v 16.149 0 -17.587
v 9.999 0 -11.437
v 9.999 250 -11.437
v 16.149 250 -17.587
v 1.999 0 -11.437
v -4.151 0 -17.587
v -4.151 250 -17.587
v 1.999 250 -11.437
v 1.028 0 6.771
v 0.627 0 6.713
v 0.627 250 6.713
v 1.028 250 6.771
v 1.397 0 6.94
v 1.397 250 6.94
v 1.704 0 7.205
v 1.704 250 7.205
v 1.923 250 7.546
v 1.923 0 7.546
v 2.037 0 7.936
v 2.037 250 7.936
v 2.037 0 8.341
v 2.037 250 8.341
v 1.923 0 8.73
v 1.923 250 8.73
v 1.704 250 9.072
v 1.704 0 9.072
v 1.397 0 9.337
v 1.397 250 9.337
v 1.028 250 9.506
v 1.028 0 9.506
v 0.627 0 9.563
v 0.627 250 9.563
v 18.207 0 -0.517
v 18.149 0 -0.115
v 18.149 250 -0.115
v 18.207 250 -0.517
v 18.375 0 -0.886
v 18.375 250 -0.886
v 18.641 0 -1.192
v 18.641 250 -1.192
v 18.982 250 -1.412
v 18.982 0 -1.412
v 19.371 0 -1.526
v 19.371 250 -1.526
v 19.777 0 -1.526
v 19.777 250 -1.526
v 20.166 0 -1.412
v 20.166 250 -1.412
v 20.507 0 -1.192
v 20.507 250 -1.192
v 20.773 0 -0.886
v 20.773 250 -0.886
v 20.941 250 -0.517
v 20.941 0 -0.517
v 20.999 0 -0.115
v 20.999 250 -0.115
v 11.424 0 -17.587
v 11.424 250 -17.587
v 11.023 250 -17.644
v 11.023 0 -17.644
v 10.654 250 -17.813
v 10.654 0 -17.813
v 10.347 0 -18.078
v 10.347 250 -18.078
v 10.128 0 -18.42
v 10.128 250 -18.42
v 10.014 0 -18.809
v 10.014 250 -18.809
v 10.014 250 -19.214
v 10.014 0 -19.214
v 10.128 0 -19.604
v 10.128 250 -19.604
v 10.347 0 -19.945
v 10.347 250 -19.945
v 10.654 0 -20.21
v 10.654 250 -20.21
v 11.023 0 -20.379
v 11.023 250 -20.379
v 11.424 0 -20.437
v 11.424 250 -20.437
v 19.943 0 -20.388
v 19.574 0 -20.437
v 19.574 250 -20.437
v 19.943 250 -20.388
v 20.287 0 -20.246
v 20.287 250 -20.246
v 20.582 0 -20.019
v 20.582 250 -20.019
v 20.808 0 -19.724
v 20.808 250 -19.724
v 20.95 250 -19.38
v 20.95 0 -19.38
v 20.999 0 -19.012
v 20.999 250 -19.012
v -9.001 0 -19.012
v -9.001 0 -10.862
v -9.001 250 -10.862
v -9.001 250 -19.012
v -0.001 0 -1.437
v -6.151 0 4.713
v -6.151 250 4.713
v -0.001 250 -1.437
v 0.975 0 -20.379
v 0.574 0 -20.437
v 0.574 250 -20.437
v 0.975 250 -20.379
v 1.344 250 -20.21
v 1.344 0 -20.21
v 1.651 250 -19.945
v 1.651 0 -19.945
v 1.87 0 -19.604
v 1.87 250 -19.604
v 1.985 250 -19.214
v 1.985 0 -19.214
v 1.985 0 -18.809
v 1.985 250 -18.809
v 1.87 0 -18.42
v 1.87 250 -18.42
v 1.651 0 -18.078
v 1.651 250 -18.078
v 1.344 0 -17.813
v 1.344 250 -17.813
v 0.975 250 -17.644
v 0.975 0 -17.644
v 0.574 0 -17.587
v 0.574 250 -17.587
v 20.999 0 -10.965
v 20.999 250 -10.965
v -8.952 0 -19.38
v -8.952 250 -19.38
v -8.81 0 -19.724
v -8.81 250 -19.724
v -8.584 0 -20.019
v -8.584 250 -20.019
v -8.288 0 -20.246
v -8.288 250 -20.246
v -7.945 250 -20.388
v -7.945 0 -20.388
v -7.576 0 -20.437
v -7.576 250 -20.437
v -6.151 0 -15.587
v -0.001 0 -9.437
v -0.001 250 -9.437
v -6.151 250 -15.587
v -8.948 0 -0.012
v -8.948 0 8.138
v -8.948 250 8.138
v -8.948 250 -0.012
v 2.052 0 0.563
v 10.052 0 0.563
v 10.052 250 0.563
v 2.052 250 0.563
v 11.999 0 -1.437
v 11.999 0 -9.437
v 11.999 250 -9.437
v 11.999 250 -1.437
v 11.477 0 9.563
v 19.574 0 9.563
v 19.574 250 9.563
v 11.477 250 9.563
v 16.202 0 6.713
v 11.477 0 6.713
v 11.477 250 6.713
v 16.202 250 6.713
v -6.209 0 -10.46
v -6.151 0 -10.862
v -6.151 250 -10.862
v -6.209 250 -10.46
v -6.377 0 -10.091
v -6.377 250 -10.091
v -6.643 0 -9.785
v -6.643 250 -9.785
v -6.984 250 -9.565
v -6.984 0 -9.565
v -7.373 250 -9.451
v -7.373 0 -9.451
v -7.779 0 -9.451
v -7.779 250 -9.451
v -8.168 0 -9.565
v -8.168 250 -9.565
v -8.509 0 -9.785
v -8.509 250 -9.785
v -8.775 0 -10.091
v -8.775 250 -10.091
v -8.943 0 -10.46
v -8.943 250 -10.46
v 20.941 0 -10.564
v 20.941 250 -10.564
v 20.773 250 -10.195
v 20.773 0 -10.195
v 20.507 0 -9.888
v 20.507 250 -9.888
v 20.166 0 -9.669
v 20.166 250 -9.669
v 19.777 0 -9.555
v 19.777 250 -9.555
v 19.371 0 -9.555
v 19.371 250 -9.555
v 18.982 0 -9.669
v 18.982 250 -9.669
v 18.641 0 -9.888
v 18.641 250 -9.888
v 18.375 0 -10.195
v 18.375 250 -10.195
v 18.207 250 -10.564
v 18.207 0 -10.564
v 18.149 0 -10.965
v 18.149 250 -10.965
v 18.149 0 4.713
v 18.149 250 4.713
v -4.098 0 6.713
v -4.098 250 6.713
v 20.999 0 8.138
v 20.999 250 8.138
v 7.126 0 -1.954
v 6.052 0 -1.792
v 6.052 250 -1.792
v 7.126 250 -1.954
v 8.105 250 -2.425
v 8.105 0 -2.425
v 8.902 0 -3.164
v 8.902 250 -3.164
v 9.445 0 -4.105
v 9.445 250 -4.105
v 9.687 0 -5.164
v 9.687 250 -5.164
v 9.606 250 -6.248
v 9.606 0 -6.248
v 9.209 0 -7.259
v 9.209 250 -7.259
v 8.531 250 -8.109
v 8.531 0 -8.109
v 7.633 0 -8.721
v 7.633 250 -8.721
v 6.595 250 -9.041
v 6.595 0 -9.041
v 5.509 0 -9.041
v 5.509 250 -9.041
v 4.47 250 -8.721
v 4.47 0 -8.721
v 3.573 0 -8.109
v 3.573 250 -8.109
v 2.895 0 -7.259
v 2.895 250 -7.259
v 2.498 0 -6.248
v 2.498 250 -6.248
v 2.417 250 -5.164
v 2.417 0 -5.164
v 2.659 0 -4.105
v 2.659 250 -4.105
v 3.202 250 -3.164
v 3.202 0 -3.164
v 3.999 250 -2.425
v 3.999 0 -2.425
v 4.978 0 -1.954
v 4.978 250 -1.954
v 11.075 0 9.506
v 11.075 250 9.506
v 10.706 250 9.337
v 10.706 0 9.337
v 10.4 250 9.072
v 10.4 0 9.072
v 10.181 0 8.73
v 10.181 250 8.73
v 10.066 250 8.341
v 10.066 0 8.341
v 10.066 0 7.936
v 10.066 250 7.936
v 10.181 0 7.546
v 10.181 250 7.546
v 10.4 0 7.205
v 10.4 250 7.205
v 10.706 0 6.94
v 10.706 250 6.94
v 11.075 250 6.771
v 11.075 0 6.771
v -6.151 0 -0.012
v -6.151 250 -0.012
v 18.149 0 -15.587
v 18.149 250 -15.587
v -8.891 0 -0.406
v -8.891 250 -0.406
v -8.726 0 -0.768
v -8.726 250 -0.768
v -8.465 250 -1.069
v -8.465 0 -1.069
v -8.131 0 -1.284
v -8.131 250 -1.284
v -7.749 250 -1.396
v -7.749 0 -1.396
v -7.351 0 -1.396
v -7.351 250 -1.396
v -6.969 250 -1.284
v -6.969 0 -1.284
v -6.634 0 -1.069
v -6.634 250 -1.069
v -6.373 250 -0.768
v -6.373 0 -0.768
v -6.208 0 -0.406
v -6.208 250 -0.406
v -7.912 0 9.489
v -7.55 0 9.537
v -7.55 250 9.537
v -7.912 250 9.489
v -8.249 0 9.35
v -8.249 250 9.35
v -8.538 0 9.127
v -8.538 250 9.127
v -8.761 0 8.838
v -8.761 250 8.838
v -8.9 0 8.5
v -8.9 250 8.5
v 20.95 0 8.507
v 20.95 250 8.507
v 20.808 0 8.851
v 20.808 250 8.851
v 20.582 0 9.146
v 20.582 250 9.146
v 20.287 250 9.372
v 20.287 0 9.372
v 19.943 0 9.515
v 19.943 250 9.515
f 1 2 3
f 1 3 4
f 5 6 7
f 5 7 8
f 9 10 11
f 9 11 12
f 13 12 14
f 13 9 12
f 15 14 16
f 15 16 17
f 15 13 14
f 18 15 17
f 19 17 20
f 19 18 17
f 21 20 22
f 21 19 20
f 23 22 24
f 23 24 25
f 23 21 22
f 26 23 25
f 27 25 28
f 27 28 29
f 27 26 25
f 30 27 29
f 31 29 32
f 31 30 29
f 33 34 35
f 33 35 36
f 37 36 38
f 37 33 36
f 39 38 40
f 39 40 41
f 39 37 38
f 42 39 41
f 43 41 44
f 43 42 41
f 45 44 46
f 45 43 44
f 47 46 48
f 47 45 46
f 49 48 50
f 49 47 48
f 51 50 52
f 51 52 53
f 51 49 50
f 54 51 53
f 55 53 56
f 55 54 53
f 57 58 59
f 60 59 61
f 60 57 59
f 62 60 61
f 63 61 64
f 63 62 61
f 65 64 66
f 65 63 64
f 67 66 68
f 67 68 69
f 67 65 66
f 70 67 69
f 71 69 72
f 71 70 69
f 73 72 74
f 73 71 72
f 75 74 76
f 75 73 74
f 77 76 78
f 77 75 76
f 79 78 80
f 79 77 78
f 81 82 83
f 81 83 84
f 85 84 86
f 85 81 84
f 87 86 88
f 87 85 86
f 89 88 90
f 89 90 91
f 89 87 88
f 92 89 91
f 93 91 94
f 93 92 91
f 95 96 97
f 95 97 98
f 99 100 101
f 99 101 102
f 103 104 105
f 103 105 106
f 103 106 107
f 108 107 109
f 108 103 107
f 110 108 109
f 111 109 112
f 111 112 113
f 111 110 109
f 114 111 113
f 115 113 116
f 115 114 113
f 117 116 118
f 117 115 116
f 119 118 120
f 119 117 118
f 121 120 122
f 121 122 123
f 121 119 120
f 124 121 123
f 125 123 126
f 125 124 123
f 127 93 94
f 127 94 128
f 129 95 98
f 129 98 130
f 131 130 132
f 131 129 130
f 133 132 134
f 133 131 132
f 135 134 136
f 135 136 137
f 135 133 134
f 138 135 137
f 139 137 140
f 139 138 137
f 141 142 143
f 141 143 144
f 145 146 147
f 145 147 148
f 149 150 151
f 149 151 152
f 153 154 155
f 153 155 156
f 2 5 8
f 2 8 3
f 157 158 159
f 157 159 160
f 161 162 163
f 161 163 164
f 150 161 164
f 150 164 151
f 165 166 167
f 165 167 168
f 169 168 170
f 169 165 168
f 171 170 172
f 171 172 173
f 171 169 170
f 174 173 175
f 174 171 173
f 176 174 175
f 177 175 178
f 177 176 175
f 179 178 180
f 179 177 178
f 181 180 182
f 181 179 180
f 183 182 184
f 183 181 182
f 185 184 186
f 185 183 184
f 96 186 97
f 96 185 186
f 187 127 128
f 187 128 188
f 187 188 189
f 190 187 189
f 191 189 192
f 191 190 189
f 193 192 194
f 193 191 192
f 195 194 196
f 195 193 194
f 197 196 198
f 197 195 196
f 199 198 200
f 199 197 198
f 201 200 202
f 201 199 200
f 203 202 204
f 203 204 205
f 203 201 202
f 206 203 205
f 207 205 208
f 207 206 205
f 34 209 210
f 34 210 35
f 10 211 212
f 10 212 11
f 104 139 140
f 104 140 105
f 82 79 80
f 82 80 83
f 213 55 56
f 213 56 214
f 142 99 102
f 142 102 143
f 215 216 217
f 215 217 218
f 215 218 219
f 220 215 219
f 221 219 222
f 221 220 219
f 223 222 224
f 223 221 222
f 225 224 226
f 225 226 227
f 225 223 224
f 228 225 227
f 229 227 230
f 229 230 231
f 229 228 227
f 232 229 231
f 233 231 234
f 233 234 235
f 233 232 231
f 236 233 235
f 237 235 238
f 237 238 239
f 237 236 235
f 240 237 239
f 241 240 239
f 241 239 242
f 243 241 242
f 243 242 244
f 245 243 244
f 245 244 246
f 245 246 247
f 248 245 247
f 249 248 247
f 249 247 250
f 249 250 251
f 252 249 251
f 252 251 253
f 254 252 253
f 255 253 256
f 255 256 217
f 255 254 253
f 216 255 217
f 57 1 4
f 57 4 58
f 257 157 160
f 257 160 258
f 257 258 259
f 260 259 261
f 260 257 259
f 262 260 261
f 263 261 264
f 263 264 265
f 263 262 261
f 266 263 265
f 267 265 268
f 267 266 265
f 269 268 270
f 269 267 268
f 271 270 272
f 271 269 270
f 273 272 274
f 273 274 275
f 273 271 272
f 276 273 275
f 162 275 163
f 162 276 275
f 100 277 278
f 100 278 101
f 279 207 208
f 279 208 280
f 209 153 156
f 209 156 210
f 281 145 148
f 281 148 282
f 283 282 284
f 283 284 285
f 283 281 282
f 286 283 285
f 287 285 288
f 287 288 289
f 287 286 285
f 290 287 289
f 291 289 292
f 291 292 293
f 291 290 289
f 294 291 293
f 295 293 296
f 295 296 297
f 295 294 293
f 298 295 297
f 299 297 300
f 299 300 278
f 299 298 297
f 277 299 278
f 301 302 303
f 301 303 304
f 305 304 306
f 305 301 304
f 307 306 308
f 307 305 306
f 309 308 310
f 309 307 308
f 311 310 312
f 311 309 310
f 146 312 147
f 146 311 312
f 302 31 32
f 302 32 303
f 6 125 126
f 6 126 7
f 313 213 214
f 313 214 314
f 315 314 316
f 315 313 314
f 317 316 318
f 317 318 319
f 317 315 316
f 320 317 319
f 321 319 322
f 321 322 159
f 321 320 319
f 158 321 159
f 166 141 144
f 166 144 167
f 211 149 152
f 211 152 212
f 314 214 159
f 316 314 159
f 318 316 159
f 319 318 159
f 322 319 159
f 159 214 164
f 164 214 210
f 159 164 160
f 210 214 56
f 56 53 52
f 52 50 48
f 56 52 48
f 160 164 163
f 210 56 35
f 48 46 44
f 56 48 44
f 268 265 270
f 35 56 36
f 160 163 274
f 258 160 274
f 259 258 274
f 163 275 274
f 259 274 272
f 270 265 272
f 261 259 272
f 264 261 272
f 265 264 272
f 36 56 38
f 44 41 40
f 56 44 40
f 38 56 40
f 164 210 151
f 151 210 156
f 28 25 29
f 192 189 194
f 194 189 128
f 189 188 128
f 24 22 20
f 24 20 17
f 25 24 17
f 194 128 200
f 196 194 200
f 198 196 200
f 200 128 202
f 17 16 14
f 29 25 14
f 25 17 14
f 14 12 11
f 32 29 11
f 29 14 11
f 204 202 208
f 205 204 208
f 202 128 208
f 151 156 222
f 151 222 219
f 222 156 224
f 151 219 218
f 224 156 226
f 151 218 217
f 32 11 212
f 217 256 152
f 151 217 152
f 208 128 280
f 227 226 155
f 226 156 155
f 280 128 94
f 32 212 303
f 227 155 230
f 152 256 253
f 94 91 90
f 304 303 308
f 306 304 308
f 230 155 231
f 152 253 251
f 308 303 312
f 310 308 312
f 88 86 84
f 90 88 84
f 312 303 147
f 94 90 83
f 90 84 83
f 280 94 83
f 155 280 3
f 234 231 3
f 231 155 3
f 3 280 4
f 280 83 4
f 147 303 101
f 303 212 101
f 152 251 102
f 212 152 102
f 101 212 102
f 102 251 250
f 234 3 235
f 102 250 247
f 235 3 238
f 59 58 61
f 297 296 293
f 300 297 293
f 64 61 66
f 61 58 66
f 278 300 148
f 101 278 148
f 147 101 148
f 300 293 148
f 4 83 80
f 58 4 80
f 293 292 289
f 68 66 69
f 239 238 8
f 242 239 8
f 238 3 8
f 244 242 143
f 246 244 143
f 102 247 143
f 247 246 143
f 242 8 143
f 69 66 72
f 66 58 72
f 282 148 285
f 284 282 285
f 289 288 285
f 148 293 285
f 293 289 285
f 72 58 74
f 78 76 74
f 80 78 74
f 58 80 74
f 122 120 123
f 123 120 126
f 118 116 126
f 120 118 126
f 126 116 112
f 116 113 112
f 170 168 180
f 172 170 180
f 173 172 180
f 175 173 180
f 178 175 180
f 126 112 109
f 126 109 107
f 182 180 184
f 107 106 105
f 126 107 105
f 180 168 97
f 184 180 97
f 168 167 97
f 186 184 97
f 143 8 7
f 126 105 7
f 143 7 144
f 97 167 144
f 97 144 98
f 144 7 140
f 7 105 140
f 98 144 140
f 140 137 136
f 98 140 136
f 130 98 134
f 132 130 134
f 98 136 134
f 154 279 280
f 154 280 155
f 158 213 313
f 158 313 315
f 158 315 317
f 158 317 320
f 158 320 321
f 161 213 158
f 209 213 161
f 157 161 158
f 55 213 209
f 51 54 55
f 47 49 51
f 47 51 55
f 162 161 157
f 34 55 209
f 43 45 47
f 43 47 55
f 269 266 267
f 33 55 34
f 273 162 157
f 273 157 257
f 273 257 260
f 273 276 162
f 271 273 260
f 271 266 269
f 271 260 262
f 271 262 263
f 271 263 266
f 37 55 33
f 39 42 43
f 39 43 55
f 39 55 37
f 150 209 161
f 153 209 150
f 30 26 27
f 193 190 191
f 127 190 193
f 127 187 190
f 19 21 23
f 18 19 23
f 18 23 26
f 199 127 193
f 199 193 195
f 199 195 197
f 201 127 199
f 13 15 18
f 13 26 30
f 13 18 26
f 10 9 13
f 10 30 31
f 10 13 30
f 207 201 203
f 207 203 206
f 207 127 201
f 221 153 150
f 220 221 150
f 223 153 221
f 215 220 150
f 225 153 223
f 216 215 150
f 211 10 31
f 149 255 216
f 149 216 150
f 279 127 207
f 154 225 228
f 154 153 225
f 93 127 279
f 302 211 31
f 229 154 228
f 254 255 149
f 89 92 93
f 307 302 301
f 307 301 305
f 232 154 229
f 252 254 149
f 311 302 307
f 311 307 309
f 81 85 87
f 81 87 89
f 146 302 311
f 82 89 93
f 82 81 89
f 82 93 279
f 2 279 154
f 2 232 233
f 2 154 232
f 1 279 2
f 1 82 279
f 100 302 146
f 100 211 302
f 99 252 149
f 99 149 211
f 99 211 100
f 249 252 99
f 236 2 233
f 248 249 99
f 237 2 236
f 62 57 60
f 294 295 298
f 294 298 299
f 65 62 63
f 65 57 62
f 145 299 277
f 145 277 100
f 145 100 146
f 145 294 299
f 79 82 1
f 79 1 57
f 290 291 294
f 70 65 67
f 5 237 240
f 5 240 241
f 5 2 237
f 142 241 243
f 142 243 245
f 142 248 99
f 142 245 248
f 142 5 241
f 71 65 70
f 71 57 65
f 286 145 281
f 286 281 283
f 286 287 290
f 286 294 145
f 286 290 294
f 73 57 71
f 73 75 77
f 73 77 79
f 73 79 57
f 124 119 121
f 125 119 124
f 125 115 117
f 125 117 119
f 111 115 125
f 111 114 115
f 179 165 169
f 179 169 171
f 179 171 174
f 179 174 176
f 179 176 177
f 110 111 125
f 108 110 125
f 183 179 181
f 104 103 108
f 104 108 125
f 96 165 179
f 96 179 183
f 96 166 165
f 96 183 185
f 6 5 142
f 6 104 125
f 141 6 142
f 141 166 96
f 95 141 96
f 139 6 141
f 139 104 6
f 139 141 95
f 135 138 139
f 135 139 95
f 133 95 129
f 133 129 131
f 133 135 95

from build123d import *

# Parameters (mm, degrees)
CROQUIS1_R              = 3.645
SALIENTE_EXTRUIR1_DEPTH = 250


with BuildPart() as part:
    # Croquis1 → Saliente-Extruir1 (new body)
    with BuildSketch(Plane(origin=(0, 0, 0), x_dir=(1, 0, 0), z_dir=(0, 1, 0))):
        with BuildLine():
            Line((11.476895811, -6.713360964), (16.201895811, -6.713360964))
            Line((16.201895811, -6.713360964), (10.051895811, -0.563360964))
            Line((10.051895811, -0.563360964), (2.051895811, -0.563360964))
            Line((2.051895811, -0.563360964), (-4.098104189, -6.713360964))
            Line((-4.098104189, -6.713360964), (0.626895811, -6.713360964))
            ThreePointArc((0.626895811, -6.713360964), (2.051895811, -8.138360964), (0.626895811, -9.563360964))
            Line((0.626895811, -9.563360964), (-7.549539962, -9.536925191))
            ThreePointArc((-7.549539962, -9.536925191), (-8.538474211, -9.127295213), (-8.948104189, -8.138360964))
            Line((-8.948104189, -8.138360964), (-8.948104189, 0.011639036))
            ThreePointArc((-8.948104189, 0.011639036), (-7.549539962, 1.410203263), (-6.150975734, 0.011639036))
            Line((-6.150975734, 0.011639036), (-6.150975734, -4.713360964))
            Line((-6.150975734, -4.713360964), (-0.000975734, 1.436639036))
            Line((-0.000975734, 1.436639036), (-0.000975734, 9.436639036))
            Line((-0.000975734, 9.436639036), (-6.150975734, 15.586639036))
            Line((-6.150975734, 15.586639036), (-6.150975734, 10.861639036))
            ThreePointArc((-6.150975734, 10.861639036), (-7.575975734, 9.436639036), (-9.000975734, 10.861639036))
            Line((-9.000975734, 10.861639036), (-9.000975734, 19.011592446))
            ThreePointArc((-9.000975734, 19.011592446), (-8.583602897, 20.019219609), (-7.575975734, 20.436592446))
            Line((-7.575975734, 20.436592446), (0.574024266, 20.436592446))
            ThreePointArc((0.574024266, 20.436592446), (1.999024266, 19.011592446), (0.574024266, 17.586592446))
            Line((0.574024266, 17.586592446), (-4.150975734, 17.586592446))
            Line((-4.150975734, 17.586592446), (1.999024266, 11.436592446))
            Line((1.999024266, 11.436592446), (9.999024266, 11.436592446))
            Line((9.999024266, 11.436592446), (16.149024266, 17.586592446))
            Line((16.149024266, 17.586592446), (11.424024266, 17.586592446))
            ThreePointArc((11.424024266, 17.586592446), (9.999024266, 19.011592446), (11.424024266, 20.436592446))
            Line((11.424024266, 20.436592446), (19.574024266, 20.436592446))
            ThreePointArc((19.574024266, 20.436592446), (20.581651429, 20.019219609), (20.999024266, 19.011592446))
            Line((20.999024266, 19.011592446), (20.999024266, 10.965336131))
            ThreePointArc((20.999024266, 10.965336131), (19.574024266, 9.540336131), (18.149024266, 10.965336131))
            Line((18.149024266, 10.965336131), (18.149024266, 15.586592446))
            Line((18.149024266, 15.586592446), (11.999024266, 9.436592446))
            Line((11.999024266, 9.436592446), (11.999024266, 1.436592446))
            Line((11.999024266, 1.436592446), (18.149024266, -4.713407554))
            Line((18.149024266, -4.713407554), (18.149024266, 0.115336131))
            ThreePointArc((18.149024266, 0.115336131), (19.574024266, 1.540336131), (20.999024266, 0.115336131))
            Line((20.999024266, 0.115336131), (20.999024266, -8.138360964))
            ThreePointArc((20.999024266, -8.138360964), (20.581651429, -9.145988127), (19.574024266, -9.563360964))
            Line((19.574024266, -9.563360964), (11.476895811, -9.563360964))
            ThreePointArc((11.476895811, -9.563360964), (10.051895811, -8.138360964), (11.476895811, -6.713360964))
        make_face()
        with Locations(Location((6.051895811, 5.436639036, 0), (0, 0, 270))):
            Circle(CROQUIS1_R, mode=Mode.SUBTRACT)
    extrude(amount=SALIENTE_EXTRUIR1_DEPTH)


solid = part.part
